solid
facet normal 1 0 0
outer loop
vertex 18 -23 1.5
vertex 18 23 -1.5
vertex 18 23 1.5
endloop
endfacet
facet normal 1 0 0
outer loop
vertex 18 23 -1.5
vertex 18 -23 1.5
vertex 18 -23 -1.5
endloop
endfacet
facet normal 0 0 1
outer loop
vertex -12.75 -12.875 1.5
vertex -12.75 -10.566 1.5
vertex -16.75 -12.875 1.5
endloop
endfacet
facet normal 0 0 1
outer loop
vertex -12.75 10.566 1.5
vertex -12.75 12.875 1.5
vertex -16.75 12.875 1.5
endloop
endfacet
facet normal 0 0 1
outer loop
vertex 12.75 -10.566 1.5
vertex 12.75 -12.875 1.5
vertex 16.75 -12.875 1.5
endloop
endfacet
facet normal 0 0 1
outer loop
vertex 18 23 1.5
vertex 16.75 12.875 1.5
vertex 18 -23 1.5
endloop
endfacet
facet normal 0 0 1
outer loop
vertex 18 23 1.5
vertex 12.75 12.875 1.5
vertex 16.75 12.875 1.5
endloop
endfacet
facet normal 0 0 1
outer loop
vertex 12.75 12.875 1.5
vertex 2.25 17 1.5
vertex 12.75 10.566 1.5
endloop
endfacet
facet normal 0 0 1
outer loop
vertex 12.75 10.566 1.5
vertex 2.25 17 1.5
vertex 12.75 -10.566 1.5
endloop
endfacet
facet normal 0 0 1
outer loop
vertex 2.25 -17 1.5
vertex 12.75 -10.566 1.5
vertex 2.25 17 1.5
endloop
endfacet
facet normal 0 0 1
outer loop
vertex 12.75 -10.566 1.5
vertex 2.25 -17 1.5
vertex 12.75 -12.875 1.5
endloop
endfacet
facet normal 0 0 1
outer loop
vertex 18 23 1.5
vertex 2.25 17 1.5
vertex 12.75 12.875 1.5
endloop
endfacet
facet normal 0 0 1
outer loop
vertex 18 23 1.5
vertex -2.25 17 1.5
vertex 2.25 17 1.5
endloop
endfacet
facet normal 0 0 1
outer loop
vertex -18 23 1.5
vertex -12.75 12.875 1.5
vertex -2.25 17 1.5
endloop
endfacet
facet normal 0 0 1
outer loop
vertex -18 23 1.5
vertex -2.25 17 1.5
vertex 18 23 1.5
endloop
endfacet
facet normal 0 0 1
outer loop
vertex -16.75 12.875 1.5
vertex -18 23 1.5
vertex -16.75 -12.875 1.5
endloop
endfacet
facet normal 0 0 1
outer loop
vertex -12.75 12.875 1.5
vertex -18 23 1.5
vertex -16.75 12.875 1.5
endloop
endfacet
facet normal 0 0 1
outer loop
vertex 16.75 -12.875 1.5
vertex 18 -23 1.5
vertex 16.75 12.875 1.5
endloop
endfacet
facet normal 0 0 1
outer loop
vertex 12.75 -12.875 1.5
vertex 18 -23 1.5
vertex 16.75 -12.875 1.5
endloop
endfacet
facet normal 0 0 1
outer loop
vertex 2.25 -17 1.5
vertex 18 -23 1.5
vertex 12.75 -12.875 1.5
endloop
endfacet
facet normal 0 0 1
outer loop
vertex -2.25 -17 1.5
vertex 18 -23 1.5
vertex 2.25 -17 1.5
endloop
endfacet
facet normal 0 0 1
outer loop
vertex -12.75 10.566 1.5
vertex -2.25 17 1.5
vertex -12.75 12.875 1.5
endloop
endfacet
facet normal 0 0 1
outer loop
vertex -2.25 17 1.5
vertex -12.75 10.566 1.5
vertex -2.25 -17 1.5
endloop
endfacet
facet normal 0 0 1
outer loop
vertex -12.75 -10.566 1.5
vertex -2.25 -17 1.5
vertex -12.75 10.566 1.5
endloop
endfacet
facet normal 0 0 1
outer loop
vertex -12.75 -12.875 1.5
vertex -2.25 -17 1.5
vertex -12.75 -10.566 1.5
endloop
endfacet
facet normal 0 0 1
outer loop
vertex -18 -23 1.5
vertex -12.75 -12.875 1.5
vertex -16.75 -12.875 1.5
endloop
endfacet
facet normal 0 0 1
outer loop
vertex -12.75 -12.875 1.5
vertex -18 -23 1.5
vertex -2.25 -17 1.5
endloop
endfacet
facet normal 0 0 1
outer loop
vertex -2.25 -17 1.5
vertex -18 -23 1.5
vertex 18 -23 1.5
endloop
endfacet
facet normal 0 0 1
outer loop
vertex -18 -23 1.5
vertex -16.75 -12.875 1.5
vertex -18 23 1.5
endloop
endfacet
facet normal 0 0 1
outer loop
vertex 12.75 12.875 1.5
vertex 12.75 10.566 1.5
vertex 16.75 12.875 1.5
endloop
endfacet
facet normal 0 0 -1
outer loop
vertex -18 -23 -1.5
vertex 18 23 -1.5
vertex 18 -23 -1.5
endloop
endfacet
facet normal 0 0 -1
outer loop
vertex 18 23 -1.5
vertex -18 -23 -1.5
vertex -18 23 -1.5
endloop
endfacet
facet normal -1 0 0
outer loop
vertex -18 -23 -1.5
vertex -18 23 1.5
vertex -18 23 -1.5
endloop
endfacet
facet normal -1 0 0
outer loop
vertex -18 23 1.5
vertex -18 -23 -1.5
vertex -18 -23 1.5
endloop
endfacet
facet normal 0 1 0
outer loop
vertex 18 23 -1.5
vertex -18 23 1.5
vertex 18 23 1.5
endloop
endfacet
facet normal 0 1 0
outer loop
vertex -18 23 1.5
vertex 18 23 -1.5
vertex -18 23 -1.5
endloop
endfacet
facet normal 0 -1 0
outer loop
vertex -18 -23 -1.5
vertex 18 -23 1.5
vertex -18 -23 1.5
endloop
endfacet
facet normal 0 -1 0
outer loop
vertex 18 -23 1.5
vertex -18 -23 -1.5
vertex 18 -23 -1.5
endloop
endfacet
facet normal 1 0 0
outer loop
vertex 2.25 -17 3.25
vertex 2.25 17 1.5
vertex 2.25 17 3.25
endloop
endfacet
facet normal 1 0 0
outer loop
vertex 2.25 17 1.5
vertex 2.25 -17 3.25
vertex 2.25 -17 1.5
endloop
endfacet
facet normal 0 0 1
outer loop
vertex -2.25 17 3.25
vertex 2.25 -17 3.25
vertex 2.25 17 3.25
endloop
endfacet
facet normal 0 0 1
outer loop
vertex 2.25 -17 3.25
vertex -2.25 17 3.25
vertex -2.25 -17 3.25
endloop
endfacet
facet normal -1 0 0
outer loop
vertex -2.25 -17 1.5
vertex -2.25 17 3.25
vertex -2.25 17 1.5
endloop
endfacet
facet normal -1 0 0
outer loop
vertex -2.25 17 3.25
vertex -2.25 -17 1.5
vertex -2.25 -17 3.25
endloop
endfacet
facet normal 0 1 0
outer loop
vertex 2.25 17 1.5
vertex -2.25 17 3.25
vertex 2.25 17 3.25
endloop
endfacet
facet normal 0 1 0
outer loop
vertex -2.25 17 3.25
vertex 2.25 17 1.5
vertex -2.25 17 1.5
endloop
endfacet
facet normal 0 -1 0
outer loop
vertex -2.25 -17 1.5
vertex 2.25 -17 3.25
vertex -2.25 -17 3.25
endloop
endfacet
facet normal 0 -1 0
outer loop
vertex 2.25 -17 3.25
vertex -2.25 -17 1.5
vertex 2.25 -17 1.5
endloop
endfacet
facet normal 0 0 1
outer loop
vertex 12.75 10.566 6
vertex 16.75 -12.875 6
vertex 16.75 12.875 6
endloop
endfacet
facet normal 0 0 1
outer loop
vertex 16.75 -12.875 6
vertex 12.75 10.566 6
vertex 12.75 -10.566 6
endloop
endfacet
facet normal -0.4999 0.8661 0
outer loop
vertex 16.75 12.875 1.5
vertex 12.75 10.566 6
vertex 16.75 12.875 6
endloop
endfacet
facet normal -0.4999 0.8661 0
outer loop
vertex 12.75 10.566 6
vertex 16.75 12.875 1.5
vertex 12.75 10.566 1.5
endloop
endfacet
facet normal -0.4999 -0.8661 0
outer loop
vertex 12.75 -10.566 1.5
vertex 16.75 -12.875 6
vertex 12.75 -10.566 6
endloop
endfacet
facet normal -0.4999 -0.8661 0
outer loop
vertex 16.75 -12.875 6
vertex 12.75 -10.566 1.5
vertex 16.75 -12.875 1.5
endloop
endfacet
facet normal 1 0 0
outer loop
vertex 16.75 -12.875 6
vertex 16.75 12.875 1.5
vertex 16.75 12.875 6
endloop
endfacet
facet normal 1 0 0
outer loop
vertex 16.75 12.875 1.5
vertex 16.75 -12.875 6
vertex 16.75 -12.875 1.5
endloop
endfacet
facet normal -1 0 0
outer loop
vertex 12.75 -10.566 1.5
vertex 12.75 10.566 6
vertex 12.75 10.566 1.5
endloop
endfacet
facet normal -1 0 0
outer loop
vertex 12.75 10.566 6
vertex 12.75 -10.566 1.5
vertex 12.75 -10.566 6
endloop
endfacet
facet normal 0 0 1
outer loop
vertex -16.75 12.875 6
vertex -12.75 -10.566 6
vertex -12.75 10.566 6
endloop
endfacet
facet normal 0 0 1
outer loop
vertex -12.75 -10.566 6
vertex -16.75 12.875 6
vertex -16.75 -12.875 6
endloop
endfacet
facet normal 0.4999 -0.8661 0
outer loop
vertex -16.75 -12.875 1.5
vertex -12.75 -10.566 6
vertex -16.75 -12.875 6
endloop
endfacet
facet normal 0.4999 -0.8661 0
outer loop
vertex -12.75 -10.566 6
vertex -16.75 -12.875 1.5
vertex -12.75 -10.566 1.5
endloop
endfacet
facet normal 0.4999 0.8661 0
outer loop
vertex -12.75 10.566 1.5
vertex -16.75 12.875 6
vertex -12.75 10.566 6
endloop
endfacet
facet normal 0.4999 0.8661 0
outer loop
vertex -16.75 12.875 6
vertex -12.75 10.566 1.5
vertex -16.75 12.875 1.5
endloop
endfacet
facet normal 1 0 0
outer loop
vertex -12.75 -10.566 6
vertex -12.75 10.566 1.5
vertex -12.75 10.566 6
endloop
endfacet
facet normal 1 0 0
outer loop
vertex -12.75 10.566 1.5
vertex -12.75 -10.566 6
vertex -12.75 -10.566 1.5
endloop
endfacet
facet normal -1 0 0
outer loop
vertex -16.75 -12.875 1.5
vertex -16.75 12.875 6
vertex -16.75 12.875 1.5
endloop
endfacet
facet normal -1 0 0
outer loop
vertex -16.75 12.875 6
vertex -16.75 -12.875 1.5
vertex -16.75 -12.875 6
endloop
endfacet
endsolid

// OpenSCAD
// By Lucas Gelfond
// Credit for Mount Module goes to YouMagine user fns720.
// https://www.youmagine.com/designs/camera-diver-s-handle#!design-documents
// Licensed Under CC-BY-SA

//Variables
    mountX = 36;
    mountY = 46;
    mountZ = 3;
    plateSize = 55;
    plateThick = 2;
    holePattern = 45;
    screwHole =4.5;
    
    midRailX = 4.5;
	midRailY = 34;
	midRailZ = 1.75;
	
	edgeX = 4;
	edgeY = 25.75;
	edgeZ = 4.5;

	edgeHangX = 7;
	edgeHangY = edgeY;
	edgeHangZ = 2.5;
    
    //test
    railDist = 10.5;
    
	edgeInnerAngle = 45;
	edgeOuterAngle = 25;
	edgeSideAngle = 45;
    
	edgeChamferSize = 2;
    edgeChamferAngle = 30;
    
    edgeRailNum = 3;


module baseAndMid() {
    cube([mountX, mountY, mountZ], center=true); //base
    translate([0,0,(midRailZ+mountZ)/2]) cube([midRailX, midRailY, midRailZ], center=true); //middle rail
}


//credit OpenSCAD forum user tp3
module edgeRails() {
    for(i = [1,-1]) {
        translate([(railDist+(midRailX+edgeX)/2)*i,0,(edgeZ+mountZ)/2]) {
            difference() {
                cube([edgeX,edgeY,edgeZ], center=true); //edge rails
                for (n = [1, -1]) {
                     translate([0,edgeY/2*i*n,0]) rotate([0,0,30*n]) cube([edgeX*2, edgeChamferSize, edgeZ], center=true);
                }
            }
        }
    }
} 


module cameraMount2() {
    baseAndMid();
    edgeRails();
}
cameraMount2();
